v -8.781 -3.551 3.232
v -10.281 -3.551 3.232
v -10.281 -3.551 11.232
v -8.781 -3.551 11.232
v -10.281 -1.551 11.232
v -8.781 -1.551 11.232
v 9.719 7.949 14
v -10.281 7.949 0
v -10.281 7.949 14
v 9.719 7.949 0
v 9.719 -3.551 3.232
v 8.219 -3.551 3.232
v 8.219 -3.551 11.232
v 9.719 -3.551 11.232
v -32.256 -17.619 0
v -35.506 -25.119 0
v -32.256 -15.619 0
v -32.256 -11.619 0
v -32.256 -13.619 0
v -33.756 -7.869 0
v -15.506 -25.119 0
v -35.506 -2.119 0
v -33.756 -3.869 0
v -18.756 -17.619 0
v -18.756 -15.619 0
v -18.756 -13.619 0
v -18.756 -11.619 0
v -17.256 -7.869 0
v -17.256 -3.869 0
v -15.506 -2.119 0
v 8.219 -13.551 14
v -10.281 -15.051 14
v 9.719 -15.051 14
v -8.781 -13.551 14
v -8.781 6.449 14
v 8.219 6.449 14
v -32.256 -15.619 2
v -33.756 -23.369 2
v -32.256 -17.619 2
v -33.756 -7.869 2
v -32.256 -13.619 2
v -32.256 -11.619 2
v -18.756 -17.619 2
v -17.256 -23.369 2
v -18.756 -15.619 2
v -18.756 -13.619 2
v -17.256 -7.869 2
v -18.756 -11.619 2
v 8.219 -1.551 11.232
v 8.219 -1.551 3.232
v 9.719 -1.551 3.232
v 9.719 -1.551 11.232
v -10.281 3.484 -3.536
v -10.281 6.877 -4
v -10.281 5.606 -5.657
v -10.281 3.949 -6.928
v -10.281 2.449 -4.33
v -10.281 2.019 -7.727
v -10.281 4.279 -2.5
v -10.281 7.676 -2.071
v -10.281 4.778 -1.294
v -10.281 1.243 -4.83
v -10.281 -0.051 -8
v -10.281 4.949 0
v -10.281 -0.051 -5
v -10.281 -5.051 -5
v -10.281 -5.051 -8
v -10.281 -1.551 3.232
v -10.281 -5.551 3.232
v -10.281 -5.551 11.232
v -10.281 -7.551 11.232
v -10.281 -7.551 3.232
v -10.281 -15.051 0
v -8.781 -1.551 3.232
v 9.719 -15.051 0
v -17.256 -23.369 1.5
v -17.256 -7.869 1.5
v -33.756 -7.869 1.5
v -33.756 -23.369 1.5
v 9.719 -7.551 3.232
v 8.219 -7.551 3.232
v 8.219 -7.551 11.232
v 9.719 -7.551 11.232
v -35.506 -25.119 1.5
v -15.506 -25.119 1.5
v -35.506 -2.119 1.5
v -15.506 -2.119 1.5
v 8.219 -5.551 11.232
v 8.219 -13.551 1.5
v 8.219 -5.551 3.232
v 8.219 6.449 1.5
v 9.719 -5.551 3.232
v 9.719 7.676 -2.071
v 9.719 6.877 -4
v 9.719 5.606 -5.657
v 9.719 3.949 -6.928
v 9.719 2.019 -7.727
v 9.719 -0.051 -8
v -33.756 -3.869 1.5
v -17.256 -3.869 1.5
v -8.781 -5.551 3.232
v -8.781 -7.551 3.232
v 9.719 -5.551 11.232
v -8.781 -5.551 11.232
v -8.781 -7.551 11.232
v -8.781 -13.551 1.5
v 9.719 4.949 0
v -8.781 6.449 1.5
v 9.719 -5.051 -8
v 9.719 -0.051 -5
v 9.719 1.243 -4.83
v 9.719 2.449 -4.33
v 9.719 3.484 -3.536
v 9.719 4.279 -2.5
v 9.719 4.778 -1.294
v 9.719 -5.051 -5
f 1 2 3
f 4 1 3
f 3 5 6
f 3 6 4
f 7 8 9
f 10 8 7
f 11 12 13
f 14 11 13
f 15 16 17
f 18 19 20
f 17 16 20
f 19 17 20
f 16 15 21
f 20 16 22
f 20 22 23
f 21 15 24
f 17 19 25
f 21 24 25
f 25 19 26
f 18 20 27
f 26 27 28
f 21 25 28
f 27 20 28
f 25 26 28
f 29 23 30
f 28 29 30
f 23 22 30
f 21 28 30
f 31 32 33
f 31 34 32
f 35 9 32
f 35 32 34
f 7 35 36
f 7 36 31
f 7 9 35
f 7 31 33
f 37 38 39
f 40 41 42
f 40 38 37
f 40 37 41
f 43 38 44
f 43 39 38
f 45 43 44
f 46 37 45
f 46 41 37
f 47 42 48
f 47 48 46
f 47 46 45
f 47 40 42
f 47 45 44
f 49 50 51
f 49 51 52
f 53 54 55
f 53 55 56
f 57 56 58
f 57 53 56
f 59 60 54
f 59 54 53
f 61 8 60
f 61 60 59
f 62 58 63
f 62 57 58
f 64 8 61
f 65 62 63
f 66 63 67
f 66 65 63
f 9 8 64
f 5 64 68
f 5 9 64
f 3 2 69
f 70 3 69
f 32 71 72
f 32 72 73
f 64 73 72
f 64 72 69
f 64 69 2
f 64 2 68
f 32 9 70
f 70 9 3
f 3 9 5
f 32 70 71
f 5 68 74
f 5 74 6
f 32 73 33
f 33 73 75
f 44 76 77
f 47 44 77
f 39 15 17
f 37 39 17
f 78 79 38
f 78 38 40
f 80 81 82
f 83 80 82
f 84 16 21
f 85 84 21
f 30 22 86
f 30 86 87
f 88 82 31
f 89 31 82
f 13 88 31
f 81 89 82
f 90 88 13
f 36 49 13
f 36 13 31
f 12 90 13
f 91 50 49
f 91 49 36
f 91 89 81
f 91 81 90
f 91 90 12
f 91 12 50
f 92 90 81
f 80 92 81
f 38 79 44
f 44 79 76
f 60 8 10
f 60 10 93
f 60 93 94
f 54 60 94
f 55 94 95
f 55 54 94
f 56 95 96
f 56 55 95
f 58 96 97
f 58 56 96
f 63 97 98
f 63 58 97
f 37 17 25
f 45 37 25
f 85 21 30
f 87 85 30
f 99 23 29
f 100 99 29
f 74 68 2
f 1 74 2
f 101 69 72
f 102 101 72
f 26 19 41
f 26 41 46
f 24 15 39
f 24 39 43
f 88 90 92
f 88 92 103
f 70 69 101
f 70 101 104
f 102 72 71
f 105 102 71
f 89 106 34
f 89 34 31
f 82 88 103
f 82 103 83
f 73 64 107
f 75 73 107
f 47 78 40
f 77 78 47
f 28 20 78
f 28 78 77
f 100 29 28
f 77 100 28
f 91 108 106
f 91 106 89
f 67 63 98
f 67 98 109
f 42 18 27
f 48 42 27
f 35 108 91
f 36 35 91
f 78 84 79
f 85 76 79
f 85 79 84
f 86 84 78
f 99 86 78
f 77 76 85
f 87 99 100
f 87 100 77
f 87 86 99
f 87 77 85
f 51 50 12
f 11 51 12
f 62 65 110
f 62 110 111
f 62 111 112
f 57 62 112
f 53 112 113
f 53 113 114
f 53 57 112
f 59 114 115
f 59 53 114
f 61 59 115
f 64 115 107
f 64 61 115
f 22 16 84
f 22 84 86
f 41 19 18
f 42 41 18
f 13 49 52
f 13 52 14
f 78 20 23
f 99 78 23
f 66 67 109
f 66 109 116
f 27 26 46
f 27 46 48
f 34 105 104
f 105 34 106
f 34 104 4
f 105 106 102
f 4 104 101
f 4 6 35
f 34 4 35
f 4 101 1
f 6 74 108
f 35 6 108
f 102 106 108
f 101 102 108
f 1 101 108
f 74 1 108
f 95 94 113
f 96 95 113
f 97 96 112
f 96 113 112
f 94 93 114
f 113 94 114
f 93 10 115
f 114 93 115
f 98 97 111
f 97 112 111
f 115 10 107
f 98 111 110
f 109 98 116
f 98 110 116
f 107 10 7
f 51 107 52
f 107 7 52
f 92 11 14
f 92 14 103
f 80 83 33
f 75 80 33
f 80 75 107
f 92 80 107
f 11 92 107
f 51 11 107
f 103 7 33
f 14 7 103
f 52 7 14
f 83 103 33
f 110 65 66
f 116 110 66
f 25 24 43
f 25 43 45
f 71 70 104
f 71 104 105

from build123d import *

# Parameters (mm, degrees)
F0_W     = 20
F0_H     = 23
F0_W_2   = 17
F0_H_2   = 20
F1_DEPTH = 14
F2_DEPTH = 1.5
F3_W     = 20
F3_H     = 23
F4_DEPTH = 1.5
F3_W_2   = 16.5
F3_H_2   = 15.5
F3_W_3   = 13.5
F3_H_3   = 2
F5_DEPTH = 2
F6_W     = 2
F6_H     = 8
F6_H_2   = 8.00022727
F7_DEPTH = 25
F8_W     = 5
F8_H     = 3
F9_DEPTH = 20


# Not quite as in the source:
# - a feature names something its author has since deleted; it is built from what else it names


with BuildPart() as f1:
    # F0 (on Top) → F1 (new body)
    with BuildSketch(Plane.XY):
        with Locations((-0.2807364799, -3.5512268197)):
            Rectangle(F0_W, F0_H)
        with Locations((-0.2807364799, -3.5512268197)):
            Rectangle(F0_W_2, F0_H_2, mode=Mode.SUBTRACT)
    extrude(amount=F1_DEPTH)

    # F0 (on Top) → F2 (join)
    with BuildSketch(Plane.XY):
        with Locations((-0.2807364799, -3.5512268197)):
            Rectangle(F0_W_2, F0_H_2)
    extrude(amount=F2_DEPTH)

    # F6 (on face) → F7 (cut)
    with BuildSketch(Plane(origin=(-10.2807364799, 0, 0), x_dir=(0, -1, 0), z_dir=(-1, 0, 0))):
        with Locations((2.5512268197, 7.2315260049)):
            Rectangle(F6_W, F6_H)
        with Locations((6.5512268197, 7.2316396399)):
            Rectangle(F6_W, F6_H_2)
    extrude(amount=-F7_DEPTH, mode=Mode.SUBTRACT)

    # F8 (on face) → F9 (join)
    with BuildSketch(Plane(origin=(-10.2807364799, 0, 0), x_dir=(0, -1, 0), z_dir=(-1, 0, 0))):
        with BuildLine():
            ThreePointArc((0.0512268197, -5), (-3.4843070863, -3.5355339059), (-4.9487731803, 0))
            Line((-4.9487731803, 0), (-7.9487731803, 0))
            ThreePointArc((-7.9487731803, 0), (-5.6056274298, -5.6568542495), (0.0512268197, -8))
            Line((0.0512268197, -8), (0.0512268197, -5))
        make_face()
        with Locations((2.5512268197, -6.5)):
            Rectangle(F8_W, F8_H)
    extrude(amount=-F9_DEPTH)


with BuildPart() as f4:
    # F3 (on Top) → F4 (new body)
    with BuildSketch(Plane.XY):
        with Locations((-25.5064666271, -13.6185353845)):
            Rectangle(F3_W, F3_H)
        Polygon((-33.7564666271, -7.8685353845), (-33.7564666271, -3.8685353845), (-17.2564666271, -3.8685353845), (-17.2564666271, -7.8685353845), (-17.2564666271, -23.3685353845), (-33.7564666271, -23.3685353845), align=None, mode=Mode.SUBTRACT)
    extrude(amount=F4_DEPTH)

    # F3 (on Top) → F5 (join)
    with BuildSketch(Plane.XY):
        with Locations((-25.5064666271, -15.6185353845)):
            Rectangle(F3_W_2, F3_H_2)
        with Locations((-25.5064666271, -16.6185353845)):
            Rectangle(F3_W_3, F3_H_3, mode=Mode.SUBTRACT)
        with Locations((-25.5064666271, -12.6185353845)):
            Rectangle(F3_W_3, F3_H_3, mode=Mode.SUBTRACT)
    extrude(amount=F5_DEPTH)


solid = Compound([f1.part, f4.part])
